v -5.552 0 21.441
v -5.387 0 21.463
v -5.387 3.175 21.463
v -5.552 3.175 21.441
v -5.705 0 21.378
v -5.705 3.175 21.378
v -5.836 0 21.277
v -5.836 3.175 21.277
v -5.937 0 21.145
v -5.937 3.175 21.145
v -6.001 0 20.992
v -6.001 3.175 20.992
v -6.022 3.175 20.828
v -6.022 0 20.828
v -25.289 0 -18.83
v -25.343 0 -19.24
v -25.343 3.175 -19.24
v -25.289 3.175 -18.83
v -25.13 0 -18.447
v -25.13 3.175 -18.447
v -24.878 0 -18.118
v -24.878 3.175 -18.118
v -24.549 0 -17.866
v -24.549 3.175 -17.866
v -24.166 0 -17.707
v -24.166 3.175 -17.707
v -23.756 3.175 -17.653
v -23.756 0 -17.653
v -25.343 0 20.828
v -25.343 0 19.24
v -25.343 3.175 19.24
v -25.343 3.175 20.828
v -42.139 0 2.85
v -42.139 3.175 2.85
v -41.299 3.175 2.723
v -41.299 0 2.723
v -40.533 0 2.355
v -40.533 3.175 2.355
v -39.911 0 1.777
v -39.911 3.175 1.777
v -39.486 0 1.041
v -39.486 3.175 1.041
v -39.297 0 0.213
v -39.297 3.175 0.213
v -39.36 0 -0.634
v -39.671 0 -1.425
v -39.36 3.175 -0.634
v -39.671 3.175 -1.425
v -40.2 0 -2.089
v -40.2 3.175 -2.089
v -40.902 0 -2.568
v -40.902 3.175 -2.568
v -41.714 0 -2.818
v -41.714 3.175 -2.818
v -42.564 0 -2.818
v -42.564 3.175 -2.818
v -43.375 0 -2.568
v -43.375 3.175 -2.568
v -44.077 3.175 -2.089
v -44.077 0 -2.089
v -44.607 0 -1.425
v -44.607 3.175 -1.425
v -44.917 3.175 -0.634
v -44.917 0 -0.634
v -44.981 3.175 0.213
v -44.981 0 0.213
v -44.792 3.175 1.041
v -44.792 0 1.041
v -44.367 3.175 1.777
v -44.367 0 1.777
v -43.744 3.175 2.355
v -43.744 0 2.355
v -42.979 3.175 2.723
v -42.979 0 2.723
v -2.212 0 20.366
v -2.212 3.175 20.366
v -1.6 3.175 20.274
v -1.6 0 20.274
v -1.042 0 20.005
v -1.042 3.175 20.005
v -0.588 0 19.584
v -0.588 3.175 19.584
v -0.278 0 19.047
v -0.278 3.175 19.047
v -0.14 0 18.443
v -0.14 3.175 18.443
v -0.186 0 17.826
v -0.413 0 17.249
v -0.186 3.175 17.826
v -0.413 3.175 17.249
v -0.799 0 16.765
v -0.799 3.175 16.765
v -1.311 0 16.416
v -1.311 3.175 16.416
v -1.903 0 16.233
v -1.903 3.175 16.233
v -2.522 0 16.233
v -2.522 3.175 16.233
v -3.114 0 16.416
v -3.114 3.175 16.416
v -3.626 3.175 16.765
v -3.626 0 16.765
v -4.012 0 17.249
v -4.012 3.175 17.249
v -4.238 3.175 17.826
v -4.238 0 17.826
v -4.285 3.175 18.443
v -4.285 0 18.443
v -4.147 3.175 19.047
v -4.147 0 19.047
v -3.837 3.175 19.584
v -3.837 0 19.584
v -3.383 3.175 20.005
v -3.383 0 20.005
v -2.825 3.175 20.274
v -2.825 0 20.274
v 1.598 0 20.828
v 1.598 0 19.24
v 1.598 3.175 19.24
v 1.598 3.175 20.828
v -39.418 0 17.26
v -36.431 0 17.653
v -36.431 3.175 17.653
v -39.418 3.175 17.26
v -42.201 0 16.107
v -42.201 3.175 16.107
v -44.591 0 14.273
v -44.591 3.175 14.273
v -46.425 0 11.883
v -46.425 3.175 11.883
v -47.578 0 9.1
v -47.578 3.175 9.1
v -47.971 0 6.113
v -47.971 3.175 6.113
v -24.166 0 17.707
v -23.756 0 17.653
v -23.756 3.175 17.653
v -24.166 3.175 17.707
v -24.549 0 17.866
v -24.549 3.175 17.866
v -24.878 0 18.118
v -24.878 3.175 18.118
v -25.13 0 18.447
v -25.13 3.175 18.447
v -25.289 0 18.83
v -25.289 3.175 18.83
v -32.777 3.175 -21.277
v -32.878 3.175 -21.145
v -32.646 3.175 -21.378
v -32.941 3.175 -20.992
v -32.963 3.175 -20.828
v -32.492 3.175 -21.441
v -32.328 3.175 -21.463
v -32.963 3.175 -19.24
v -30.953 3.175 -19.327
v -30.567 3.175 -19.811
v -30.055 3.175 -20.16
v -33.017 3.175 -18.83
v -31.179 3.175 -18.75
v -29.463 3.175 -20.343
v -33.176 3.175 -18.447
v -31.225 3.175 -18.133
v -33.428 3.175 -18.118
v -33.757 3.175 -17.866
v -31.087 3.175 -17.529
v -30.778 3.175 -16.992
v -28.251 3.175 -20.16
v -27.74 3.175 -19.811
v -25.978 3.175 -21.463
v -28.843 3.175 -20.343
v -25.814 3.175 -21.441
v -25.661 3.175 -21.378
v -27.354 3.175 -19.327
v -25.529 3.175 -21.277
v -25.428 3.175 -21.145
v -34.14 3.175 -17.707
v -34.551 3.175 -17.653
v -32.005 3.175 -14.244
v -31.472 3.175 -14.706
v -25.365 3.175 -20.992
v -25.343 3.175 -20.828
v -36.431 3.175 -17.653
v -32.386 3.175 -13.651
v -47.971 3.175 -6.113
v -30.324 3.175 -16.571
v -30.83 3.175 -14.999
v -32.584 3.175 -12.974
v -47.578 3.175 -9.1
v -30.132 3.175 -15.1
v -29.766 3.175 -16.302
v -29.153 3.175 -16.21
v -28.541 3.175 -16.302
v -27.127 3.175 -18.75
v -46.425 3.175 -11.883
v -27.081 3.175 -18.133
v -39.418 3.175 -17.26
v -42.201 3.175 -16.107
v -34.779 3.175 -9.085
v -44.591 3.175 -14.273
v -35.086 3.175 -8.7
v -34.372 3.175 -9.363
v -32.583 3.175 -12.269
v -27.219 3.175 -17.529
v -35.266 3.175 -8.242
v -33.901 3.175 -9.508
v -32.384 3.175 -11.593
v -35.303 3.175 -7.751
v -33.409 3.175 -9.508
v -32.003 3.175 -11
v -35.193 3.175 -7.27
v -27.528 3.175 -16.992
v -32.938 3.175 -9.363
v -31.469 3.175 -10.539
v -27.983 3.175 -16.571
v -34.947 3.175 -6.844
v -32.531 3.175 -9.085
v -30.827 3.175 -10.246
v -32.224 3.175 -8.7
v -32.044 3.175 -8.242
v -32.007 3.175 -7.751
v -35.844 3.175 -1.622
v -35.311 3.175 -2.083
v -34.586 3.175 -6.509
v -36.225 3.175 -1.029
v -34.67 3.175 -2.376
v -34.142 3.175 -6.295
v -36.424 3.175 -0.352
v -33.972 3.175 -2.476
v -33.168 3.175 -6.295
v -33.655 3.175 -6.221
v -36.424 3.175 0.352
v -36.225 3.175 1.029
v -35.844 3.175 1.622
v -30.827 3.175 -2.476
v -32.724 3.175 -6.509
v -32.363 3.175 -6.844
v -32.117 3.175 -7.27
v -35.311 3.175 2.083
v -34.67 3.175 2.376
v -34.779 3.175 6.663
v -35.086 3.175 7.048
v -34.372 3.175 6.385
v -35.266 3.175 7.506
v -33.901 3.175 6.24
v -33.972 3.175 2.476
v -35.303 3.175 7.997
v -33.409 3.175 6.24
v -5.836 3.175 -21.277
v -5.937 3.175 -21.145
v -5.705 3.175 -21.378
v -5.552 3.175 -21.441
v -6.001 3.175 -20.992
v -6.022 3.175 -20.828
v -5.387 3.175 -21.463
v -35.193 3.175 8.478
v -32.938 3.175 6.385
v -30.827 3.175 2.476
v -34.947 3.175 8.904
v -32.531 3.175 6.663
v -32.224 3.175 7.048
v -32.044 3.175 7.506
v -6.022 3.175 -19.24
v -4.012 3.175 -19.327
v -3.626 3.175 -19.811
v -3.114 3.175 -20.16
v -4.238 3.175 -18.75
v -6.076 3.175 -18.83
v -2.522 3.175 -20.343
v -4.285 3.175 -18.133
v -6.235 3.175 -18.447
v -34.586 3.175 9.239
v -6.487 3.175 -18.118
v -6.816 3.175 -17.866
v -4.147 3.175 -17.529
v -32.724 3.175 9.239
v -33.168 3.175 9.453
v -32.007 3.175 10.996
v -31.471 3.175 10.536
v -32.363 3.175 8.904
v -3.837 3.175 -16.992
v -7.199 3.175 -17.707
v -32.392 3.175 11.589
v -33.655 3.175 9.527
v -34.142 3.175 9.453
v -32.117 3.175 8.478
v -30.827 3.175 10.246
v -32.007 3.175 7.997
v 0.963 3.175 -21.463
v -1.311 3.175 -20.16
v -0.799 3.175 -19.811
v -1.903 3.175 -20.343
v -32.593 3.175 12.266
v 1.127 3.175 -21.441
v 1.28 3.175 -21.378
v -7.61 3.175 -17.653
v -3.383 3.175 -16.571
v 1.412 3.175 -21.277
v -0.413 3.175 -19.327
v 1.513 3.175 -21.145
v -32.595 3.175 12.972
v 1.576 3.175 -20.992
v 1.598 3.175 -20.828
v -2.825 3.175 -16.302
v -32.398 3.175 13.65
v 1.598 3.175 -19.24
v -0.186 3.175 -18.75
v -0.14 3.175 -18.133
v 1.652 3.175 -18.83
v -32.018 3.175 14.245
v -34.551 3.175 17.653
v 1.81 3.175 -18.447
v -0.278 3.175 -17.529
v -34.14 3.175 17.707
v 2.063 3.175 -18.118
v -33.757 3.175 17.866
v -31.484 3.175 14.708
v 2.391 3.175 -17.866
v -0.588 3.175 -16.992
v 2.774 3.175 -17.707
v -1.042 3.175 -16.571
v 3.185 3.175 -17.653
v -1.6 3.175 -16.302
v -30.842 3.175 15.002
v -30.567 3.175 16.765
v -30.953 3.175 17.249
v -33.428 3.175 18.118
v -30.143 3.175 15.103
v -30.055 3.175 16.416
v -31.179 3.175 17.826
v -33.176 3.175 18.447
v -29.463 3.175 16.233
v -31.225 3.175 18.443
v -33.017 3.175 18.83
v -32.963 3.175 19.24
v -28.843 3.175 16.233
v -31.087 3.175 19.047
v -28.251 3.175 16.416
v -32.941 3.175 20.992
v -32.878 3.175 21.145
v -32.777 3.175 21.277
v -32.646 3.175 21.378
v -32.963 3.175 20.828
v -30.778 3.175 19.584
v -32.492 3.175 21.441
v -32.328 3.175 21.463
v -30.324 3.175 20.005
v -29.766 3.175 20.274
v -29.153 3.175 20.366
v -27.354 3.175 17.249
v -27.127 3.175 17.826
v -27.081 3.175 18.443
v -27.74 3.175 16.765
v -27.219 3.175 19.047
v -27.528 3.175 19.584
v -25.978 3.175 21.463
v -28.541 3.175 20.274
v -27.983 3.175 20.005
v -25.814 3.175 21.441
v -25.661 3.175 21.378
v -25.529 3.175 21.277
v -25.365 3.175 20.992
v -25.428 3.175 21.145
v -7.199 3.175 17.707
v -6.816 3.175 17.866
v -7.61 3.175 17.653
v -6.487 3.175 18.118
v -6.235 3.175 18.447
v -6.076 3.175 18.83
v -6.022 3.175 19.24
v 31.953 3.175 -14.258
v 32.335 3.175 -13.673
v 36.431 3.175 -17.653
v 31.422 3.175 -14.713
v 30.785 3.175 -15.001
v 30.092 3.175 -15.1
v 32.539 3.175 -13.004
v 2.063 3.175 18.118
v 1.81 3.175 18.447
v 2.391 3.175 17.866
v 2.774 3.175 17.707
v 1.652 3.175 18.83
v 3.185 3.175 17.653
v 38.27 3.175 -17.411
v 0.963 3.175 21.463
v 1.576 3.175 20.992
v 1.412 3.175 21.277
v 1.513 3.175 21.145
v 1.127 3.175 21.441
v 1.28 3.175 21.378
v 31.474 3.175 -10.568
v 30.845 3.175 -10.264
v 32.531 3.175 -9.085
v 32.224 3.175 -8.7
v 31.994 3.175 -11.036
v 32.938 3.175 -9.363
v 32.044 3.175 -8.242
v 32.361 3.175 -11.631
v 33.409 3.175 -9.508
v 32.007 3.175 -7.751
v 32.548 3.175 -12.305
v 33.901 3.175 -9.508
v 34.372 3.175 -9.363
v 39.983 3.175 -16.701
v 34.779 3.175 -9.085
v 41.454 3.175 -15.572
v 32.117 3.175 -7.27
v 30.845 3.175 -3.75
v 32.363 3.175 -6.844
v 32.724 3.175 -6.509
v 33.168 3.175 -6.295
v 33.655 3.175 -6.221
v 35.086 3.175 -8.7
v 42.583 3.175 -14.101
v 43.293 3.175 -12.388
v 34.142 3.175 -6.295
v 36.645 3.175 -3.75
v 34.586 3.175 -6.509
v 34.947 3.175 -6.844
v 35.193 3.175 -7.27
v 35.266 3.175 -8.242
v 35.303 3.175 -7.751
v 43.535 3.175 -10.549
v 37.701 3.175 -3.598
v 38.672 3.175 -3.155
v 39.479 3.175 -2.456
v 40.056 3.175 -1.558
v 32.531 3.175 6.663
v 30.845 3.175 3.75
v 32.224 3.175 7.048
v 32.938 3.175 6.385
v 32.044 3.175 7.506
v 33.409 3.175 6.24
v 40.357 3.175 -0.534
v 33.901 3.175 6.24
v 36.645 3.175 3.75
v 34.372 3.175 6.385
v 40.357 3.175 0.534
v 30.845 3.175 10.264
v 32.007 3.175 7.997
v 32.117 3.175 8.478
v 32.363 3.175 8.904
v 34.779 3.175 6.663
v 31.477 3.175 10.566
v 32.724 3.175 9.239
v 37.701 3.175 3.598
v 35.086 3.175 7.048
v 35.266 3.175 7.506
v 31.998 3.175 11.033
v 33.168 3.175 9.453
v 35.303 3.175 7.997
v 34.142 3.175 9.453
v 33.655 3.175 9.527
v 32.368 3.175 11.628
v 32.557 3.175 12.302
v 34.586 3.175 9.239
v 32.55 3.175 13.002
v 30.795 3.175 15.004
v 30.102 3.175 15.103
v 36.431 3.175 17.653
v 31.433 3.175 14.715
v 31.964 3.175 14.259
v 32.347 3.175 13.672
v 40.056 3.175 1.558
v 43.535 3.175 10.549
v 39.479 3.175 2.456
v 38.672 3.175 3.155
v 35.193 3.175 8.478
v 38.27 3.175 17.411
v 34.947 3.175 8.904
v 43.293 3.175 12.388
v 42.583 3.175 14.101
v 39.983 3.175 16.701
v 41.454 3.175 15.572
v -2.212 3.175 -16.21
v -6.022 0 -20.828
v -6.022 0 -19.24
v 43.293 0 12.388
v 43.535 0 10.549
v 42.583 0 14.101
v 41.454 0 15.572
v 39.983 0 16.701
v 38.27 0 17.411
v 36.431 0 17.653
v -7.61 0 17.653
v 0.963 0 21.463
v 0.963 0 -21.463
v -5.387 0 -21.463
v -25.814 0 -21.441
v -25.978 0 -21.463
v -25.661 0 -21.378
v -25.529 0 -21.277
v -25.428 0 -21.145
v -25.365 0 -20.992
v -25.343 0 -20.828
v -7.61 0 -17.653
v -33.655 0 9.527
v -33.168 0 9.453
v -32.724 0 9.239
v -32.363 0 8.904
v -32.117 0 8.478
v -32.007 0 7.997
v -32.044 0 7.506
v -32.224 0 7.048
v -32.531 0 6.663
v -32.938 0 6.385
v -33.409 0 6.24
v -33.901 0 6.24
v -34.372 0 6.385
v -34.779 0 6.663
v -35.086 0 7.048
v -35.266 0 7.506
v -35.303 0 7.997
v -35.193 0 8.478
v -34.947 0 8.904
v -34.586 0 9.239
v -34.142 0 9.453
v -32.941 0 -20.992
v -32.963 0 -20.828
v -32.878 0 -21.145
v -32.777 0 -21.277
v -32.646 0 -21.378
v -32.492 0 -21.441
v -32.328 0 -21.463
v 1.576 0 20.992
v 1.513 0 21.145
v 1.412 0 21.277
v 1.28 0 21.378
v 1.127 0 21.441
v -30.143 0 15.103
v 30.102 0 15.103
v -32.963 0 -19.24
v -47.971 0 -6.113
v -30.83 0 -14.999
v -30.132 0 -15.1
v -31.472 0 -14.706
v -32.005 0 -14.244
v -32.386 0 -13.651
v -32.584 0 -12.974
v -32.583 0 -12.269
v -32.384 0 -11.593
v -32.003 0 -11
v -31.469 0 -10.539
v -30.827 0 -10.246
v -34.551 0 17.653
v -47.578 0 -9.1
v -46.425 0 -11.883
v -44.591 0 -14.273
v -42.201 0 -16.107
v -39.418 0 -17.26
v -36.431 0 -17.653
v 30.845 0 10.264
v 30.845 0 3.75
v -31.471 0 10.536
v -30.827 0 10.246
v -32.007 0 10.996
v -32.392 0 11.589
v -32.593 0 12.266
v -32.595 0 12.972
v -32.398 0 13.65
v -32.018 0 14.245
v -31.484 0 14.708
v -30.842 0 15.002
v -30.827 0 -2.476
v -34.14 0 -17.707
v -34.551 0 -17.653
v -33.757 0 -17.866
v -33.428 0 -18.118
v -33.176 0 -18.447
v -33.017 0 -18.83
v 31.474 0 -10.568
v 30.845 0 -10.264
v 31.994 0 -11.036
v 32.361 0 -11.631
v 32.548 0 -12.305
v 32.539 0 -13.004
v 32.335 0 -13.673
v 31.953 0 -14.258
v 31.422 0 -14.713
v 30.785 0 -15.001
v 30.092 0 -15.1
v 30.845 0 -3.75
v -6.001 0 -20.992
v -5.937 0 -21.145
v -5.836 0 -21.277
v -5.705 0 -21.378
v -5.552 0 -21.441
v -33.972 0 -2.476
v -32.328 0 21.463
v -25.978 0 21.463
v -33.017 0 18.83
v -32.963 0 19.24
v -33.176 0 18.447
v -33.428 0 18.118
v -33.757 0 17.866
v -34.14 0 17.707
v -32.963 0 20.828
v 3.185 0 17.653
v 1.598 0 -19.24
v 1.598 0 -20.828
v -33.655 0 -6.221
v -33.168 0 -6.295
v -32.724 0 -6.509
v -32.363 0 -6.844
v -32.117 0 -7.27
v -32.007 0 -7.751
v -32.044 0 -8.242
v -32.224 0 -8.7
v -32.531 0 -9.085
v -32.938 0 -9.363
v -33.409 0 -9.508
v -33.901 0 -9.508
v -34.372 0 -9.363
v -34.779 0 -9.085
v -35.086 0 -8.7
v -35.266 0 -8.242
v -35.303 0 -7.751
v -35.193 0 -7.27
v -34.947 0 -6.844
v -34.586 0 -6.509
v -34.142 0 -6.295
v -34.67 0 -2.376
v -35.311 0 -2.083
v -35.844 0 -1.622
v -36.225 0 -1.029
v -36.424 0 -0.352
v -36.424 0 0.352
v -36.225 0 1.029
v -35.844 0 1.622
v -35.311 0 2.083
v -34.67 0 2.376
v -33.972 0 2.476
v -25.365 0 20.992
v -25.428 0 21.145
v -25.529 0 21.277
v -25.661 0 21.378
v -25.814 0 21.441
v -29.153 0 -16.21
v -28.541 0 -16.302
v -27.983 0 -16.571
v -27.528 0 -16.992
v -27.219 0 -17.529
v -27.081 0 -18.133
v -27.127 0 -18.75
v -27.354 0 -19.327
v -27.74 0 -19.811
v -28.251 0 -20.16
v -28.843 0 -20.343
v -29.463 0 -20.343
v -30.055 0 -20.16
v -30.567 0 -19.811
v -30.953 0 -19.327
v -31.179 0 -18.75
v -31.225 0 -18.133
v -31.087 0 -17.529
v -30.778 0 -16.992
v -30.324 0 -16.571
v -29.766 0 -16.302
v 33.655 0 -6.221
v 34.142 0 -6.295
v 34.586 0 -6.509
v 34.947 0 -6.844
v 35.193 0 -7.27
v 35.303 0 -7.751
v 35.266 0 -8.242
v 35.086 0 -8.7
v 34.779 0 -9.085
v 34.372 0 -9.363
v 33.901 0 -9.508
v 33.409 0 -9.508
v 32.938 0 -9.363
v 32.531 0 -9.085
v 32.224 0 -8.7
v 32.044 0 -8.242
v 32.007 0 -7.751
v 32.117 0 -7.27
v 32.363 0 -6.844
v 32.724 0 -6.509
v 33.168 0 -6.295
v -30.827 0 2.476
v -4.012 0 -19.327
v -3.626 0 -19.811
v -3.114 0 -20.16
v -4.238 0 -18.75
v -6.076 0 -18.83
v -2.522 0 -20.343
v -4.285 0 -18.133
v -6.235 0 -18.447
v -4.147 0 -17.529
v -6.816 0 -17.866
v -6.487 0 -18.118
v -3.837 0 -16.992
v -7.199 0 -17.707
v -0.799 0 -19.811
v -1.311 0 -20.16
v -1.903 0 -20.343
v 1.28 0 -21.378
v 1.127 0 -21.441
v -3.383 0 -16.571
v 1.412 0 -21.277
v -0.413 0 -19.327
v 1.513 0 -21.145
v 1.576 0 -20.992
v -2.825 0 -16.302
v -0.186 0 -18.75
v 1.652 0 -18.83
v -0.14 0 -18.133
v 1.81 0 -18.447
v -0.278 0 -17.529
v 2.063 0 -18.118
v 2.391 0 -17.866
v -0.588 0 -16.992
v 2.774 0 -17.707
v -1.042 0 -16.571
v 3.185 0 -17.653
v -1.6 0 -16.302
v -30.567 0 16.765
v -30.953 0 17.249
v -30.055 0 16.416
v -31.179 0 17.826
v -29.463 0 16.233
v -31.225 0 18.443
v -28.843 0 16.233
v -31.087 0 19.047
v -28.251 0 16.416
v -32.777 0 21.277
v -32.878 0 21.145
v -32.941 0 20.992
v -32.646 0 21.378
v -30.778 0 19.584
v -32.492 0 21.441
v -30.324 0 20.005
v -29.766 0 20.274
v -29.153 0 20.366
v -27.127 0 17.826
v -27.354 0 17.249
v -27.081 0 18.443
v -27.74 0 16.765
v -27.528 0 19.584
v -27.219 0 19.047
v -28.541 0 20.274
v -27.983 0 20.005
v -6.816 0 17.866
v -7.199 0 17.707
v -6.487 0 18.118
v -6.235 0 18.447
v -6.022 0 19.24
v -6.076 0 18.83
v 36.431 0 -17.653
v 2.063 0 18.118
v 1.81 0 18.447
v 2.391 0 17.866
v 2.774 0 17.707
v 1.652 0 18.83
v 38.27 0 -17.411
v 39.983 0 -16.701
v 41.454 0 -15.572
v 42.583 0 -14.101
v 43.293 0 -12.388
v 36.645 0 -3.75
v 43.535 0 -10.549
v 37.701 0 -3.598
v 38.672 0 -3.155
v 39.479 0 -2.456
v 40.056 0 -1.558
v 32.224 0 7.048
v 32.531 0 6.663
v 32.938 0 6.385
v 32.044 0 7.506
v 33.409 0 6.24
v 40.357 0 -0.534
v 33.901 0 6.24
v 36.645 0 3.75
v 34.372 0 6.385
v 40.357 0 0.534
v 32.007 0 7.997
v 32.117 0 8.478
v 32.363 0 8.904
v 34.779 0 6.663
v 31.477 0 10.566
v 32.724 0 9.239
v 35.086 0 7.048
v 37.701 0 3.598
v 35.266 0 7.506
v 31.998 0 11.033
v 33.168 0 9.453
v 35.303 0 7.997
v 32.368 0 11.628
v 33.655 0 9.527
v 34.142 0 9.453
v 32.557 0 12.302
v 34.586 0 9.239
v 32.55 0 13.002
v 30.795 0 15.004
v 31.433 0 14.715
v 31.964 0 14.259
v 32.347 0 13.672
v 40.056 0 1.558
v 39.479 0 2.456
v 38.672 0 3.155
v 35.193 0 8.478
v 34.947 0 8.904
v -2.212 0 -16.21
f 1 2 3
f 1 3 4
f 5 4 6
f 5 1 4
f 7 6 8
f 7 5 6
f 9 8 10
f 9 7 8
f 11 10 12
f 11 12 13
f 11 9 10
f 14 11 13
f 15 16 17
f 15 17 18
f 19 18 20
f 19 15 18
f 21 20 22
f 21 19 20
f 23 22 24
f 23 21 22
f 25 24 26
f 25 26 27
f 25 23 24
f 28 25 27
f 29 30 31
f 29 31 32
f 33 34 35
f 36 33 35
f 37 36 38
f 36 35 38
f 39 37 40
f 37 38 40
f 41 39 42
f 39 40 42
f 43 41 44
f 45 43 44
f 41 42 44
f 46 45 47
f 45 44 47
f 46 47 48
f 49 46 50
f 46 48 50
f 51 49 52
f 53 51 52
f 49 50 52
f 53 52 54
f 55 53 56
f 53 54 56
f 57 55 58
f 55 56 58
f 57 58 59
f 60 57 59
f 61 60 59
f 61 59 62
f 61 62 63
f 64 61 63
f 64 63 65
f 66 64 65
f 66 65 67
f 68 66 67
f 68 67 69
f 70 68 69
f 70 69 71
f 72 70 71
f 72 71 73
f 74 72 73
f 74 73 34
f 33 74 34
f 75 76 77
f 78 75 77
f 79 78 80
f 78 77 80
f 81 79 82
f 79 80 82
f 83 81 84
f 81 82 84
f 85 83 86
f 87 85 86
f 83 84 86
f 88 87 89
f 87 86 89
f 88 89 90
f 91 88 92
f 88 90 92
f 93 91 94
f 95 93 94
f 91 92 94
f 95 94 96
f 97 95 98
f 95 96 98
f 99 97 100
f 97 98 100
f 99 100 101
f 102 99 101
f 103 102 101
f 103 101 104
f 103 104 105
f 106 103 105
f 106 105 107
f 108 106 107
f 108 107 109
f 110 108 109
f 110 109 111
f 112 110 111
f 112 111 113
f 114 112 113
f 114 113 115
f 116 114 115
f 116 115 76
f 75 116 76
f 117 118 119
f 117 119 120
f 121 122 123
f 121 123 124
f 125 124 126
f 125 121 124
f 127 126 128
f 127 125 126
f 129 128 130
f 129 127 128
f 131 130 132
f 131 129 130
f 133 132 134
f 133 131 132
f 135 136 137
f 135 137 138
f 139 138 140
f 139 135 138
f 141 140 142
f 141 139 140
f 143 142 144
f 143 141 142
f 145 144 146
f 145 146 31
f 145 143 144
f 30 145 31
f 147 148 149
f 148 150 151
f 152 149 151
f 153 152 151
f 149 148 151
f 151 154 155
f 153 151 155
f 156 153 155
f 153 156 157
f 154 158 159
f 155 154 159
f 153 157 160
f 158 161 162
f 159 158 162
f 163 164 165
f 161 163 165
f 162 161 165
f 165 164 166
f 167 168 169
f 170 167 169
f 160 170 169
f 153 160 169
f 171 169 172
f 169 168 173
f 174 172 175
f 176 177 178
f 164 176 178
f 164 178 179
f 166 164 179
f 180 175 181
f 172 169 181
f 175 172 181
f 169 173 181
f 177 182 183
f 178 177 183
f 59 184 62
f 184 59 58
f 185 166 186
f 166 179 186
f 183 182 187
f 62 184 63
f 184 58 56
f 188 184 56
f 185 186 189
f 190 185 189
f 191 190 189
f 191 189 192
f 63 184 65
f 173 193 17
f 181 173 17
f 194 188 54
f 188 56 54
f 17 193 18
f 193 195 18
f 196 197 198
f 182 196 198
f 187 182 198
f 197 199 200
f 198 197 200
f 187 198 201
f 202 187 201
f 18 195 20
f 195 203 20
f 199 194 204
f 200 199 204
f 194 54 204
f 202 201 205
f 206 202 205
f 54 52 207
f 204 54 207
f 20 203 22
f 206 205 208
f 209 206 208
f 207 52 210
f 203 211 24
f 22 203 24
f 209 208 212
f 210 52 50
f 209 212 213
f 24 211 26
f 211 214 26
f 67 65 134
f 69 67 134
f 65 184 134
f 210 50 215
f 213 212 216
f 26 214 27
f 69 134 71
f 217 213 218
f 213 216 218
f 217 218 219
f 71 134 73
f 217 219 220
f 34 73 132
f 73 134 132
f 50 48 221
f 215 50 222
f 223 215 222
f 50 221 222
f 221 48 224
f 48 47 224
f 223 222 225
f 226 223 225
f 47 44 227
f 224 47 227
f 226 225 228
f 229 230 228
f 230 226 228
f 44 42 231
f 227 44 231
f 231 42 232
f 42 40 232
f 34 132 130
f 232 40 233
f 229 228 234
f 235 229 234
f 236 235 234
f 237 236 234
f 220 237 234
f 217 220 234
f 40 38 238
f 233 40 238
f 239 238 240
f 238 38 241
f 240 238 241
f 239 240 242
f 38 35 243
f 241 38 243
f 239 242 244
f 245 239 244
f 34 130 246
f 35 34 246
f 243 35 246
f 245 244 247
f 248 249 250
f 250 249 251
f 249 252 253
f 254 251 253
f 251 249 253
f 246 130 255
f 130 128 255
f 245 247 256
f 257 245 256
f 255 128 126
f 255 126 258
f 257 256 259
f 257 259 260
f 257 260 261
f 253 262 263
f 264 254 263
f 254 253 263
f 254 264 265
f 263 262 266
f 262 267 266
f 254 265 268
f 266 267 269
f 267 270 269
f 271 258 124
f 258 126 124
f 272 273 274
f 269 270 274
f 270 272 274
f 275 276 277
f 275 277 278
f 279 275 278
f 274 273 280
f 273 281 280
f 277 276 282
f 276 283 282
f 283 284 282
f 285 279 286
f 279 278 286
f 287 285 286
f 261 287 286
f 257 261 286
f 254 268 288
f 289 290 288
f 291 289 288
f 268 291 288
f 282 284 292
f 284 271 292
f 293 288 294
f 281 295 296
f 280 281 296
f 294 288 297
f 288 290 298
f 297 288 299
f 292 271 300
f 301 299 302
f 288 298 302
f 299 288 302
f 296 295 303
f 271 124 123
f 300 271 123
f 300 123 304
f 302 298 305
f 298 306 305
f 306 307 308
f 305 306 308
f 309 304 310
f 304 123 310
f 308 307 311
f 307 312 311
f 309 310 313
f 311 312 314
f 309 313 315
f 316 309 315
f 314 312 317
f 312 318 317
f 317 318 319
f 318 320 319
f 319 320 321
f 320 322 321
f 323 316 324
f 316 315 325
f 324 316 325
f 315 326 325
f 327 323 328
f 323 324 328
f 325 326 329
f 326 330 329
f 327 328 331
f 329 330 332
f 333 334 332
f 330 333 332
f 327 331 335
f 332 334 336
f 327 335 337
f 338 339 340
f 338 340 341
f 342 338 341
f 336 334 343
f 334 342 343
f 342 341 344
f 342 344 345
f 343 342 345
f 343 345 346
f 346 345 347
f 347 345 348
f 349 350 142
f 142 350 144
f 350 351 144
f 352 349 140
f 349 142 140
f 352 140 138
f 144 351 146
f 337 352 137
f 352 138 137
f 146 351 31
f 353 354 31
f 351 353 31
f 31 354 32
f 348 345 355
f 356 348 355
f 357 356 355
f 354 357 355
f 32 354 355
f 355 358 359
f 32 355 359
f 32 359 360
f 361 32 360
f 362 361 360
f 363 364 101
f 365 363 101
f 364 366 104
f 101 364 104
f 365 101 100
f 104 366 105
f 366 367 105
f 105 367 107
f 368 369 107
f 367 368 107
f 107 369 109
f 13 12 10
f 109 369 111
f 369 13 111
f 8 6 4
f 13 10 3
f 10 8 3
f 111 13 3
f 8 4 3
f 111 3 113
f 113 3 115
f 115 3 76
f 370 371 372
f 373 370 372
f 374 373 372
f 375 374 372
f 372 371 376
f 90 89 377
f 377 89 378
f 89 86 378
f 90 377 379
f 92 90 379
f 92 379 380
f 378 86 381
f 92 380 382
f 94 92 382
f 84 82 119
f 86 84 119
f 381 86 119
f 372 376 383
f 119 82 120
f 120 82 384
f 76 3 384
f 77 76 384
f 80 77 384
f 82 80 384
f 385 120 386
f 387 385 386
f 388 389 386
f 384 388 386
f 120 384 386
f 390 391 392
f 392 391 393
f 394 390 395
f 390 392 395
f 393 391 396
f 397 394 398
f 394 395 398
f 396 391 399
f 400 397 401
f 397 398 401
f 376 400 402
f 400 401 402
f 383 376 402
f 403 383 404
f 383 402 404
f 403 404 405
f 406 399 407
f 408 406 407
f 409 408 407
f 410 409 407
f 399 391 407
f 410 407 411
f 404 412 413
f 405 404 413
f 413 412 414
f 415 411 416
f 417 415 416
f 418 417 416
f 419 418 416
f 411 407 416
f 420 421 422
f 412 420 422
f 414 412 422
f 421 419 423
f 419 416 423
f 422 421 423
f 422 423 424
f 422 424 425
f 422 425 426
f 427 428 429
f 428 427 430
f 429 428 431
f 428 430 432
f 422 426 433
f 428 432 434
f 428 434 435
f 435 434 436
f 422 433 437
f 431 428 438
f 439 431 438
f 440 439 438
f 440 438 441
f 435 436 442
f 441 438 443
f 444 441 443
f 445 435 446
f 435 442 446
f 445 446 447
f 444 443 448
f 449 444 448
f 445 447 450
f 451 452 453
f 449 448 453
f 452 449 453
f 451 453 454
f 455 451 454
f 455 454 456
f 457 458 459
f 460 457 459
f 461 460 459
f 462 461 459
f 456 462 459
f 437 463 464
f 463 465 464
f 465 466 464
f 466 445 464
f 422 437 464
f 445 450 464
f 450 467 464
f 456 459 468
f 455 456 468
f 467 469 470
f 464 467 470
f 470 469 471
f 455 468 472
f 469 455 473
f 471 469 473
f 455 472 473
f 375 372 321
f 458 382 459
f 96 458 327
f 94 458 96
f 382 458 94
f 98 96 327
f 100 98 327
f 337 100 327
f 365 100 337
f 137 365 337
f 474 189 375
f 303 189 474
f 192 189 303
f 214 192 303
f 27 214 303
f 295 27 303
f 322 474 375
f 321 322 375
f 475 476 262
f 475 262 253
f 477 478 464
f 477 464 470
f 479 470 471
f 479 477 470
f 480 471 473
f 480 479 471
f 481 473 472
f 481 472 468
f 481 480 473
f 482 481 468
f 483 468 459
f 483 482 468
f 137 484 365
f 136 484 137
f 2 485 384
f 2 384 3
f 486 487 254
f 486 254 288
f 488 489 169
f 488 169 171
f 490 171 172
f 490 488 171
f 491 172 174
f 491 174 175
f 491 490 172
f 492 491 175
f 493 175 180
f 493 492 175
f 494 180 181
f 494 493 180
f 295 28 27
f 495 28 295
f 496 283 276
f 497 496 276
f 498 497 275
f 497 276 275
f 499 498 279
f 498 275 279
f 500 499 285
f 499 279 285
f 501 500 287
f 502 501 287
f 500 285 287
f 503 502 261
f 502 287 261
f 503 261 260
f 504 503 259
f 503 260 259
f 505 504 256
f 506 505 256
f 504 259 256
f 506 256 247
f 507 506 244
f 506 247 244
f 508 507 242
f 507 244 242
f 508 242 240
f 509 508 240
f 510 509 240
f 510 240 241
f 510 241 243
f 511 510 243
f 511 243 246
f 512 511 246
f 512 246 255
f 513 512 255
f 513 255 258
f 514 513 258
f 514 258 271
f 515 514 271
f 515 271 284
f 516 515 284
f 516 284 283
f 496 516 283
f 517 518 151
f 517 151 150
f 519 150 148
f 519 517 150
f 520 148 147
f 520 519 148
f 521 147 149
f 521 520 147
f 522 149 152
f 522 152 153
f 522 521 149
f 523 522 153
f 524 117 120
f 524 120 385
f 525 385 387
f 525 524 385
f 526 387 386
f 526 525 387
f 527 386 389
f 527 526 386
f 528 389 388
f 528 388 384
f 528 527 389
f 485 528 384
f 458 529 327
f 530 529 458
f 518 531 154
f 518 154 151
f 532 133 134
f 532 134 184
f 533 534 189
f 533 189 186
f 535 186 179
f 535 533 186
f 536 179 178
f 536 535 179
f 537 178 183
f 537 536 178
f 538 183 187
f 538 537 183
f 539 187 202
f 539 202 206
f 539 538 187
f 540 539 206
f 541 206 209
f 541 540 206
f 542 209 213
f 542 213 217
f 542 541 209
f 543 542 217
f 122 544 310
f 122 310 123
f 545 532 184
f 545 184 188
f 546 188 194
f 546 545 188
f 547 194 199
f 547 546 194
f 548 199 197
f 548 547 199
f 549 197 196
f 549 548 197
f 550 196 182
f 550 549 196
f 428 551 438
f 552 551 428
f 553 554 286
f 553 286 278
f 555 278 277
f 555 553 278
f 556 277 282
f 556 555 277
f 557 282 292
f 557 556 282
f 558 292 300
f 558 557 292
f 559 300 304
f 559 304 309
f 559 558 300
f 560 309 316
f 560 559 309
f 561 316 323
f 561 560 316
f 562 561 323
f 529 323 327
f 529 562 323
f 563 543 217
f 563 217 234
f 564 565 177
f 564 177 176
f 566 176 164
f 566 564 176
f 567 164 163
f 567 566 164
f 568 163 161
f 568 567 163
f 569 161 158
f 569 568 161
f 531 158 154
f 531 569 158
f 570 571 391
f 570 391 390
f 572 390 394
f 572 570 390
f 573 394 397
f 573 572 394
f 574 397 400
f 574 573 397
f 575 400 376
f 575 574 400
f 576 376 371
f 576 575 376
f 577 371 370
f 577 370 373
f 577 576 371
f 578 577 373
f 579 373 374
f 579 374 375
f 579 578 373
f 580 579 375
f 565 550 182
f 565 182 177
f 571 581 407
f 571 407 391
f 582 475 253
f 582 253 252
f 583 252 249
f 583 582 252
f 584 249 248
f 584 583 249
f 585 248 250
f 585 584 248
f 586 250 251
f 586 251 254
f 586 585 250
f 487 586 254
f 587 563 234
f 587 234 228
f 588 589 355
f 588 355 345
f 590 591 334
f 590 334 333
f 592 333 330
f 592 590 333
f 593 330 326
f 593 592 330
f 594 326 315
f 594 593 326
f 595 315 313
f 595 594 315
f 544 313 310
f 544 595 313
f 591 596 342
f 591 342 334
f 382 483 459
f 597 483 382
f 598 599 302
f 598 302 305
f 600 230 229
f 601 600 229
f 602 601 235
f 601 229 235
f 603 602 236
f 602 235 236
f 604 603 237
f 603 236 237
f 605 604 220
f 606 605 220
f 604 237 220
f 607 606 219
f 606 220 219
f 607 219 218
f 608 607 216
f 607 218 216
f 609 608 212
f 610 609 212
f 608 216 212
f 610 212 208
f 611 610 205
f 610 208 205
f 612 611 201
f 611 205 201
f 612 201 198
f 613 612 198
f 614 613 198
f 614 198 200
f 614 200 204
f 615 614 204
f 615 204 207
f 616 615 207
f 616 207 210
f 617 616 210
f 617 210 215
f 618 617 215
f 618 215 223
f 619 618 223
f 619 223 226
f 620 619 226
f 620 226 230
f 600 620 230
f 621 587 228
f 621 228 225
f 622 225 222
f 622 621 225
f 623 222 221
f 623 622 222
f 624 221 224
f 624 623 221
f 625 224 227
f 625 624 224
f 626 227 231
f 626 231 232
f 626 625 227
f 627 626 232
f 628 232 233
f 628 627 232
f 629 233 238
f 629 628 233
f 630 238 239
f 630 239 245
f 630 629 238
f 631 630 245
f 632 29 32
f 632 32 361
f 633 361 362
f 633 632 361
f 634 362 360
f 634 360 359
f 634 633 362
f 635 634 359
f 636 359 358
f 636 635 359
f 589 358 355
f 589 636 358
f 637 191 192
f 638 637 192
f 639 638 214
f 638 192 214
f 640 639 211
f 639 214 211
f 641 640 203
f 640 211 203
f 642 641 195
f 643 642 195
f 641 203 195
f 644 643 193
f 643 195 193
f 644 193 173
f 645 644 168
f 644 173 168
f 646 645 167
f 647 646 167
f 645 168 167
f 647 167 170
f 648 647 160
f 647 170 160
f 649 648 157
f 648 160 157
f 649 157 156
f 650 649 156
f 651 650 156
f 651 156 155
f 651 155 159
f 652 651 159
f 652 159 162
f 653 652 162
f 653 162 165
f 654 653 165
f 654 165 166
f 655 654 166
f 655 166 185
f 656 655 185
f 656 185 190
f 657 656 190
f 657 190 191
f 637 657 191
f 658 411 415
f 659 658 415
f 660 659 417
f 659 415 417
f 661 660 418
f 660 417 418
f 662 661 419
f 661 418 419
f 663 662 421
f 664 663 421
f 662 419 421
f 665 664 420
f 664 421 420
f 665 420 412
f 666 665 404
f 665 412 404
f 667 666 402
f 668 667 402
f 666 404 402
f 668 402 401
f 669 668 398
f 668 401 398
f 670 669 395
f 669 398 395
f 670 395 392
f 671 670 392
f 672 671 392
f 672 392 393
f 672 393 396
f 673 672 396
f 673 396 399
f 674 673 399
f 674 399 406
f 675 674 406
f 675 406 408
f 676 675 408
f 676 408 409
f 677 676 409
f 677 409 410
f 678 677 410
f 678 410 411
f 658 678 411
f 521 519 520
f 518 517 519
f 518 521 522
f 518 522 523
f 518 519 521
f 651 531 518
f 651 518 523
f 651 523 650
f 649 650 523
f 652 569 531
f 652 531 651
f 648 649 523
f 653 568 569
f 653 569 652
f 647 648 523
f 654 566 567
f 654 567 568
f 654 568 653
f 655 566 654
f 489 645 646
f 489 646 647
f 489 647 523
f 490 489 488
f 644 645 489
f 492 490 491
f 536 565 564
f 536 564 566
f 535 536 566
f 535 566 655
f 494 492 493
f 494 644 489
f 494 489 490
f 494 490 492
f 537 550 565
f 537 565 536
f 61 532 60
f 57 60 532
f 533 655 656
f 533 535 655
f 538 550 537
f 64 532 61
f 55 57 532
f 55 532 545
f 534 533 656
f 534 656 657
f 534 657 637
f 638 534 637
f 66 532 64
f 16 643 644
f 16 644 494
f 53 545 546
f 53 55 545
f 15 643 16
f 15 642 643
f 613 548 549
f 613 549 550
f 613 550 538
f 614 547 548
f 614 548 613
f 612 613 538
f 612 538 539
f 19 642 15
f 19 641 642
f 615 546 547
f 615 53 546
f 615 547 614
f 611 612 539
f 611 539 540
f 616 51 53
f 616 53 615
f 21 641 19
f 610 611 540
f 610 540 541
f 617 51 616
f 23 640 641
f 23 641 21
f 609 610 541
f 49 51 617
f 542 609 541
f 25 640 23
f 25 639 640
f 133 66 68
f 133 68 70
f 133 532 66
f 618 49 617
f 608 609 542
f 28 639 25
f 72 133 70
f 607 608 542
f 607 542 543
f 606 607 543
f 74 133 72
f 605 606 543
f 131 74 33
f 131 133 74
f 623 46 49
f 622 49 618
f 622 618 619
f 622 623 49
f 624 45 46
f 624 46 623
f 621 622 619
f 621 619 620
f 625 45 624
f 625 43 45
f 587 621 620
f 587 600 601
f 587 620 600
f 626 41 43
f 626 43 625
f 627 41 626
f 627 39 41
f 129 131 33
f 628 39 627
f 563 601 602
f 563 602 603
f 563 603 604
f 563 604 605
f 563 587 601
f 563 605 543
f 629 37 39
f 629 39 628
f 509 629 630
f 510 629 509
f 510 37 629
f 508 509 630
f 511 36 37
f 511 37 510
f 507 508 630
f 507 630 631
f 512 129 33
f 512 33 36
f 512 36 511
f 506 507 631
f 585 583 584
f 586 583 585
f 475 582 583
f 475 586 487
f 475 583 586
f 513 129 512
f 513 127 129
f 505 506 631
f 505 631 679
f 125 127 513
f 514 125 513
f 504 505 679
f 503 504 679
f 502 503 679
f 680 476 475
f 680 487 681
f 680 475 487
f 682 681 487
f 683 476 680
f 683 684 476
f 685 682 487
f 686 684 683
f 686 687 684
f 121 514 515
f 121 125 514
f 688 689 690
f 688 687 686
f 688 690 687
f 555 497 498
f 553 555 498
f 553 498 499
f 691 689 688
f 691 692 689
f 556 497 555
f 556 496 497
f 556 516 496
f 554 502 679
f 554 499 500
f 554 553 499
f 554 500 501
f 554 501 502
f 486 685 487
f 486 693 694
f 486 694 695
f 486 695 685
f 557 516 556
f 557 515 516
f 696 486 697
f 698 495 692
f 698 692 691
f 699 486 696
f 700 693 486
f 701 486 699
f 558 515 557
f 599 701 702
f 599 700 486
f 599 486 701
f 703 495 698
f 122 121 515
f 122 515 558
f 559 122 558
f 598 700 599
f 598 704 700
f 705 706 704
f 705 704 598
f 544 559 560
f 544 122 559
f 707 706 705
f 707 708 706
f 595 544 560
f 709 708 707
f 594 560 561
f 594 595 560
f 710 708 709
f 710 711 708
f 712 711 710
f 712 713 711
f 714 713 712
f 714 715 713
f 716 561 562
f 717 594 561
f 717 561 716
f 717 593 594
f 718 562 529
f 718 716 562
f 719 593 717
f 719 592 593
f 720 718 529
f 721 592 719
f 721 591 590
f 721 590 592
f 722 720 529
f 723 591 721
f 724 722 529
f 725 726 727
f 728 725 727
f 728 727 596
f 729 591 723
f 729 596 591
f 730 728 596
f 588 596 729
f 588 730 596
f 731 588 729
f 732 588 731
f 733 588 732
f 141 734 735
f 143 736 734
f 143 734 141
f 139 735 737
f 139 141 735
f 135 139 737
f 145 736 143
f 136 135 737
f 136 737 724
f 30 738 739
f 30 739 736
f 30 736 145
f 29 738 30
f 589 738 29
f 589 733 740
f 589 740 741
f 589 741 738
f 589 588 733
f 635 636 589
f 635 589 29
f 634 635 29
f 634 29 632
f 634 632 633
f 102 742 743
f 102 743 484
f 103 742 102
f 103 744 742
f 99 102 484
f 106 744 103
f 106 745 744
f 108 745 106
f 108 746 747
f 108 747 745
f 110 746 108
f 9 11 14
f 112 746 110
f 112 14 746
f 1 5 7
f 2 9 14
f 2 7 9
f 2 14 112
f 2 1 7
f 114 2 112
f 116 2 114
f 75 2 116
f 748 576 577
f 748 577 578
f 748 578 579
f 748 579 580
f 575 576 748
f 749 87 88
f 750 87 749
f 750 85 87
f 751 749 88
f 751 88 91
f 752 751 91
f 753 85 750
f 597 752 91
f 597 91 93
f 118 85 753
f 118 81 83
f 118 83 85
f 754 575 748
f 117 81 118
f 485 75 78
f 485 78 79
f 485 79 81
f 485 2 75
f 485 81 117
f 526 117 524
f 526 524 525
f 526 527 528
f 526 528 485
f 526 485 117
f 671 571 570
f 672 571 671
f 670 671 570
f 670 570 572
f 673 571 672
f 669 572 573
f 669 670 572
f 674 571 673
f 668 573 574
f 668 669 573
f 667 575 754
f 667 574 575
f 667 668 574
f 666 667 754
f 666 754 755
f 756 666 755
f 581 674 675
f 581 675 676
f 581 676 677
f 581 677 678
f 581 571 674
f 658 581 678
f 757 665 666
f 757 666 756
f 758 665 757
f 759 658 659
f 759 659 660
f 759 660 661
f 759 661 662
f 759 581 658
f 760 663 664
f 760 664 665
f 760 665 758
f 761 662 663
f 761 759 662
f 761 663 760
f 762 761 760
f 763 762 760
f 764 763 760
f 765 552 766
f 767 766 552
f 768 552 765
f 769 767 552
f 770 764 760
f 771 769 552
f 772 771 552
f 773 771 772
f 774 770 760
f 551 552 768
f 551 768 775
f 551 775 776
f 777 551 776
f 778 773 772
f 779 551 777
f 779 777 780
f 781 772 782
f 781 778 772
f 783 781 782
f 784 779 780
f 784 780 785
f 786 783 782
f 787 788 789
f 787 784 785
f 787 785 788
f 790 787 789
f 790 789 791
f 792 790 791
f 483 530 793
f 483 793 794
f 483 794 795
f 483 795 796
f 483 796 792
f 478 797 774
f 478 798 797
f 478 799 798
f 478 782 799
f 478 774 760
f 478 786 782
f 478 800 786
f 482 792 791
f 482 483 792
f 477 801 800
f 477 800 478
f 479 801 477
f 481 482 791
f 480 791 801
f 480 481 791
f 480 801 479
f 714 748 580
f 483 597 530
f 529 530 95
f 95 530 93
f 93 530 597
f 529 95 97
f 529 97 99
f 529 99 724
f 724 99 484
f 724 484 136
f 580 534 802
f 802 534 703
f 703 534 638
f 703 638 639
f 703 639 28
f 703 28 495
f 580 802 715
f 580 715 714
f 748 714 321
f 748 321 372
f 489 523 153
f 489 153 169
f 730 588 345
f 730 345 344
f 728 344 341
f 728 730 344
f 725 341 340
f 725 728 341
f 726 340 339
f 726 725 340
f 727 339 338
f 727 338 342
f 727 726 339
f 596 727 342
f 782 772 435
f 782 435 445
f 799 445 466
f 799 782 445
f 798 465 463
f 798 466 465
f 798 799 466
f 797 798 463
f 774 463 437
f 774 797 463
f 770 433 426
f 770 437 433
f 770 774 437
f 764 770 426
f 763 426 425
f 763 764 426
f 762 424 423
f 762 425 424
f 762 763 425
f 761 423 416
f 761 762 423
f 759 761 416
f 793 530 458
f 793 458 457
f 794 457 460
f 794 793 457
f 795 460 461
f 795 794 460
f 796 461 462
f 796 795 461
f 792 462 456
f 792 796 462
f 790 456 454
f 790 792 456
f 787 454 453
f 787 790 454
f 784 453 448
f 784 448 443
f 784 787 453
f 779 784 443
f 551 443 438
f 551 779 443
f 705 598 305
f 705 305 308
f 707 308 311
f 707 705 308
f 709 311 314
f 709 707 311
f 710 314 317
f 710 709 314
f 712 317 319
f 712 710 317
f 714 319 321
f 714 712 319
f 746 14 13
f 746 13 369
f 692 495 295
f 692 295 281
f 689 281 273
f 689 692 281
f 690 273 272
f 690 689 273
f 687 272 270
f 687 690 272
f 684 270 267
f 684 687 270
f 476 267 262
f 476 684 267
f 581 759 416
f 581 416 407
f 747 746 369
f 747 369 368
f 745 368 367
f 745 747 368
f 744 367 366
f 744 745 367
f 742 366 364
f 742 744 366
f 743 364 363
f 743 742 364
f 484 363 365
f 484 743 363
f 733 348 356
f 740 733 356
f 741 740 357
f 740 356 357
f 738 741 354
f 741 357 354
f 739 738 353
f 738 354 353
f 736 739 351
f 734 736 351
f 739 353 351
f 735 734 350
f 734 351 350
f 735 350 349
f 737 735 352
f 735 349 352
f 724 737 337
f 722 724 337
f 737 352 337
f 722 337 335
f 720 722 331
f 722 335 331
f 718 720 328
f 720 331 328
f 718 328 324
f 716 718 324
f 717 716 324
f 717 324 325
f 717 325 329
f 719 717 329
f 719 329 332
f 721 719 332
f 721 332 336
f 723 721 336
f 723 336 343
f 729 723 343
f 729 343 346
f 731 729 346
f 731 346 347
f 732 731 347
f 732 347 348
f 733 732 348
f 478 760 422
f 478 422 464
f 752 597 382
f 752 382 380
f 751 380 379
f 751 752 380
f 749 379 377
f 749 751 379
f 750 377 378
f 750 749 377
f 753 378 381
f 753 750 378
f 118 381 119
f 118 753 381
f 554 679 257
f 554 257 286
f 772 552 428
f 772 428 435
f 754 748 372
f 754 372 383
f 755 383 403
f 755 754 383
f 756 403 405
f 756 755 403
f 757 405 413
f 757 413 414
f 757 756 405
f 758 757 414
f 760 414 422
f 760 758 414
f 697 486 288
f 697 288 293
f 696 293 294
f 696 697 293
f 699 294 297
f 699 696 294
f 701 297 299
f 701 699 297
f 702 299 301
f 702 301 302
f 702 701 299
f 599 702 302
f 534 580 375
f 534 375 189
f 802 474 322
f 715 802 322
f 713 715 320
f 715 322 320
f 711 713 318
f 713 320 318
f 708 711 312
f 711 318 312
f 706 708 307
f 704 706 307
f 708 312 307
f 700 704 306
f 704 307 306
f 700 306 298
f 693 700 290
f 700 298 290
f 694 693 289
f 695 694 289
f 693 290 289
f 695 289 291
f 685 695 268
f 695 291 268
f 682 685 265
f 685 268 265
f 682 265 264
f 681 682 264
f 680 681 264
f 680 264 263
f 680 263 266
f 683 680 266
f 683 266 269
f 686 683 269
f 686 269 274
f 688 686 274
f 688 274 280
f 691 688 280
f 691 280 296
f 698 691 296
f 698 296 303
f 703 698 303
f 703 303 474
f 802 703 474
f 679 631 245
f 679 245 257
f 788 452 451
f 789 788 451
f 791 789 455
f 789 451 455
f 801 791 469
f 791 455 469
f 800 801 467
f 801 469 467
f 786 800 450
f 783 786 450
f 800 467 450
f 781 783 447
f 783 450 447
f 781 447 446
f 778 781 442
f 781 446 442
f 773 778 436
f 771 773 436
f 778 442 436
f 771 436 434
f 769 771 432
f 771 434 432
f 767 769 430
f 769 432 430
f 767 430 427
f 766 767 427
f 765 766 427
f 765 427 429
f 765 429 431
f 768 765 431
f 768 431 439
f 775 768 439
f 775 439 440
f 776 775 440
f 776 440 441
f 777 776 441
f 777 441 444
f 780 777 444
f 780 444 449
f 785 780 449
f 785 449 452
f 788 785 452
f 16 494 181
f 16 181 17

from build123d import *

# Parameters (mm, degrees)
CROQUIS1_R                 = 1.35255
CROQUIS1_R_2               = 1.778
SALIENTE_EXTRUIR1_DEPTH    = 3.175
CROQUIS5_R                 = 2.55
CORTAR_EXTRUIR1_DEPTH      = 53.649355209
CORTAR_EXTRUIR2_DEPTH      = 53.649355209
CORTAR_EXTRUIR2_DEPTH_BACK = 53.649355209
CROQUIS10_R                = 2.078
CROQUIS10_R_2              = 1.65255
CROQUIS10_R_3              = 2.85
CORTAR_EXTRUIR3_DEPTH      = 53.649355209


with BuildPart() as part:
    # Croquis1 → Saliente-Extruir1 (new body)
    with BuildSketch(Plane.XZ):
        with BuildLine():
            Line((-6.02234, -19.2405), (-6.02234, -20.828))
            ThreePointArc((-6.02234, -20.828), (-5.836352806, -21.277012806), (-5.38734, -21.463))
            Line((-5.38734, -21.463), (0.96266, -21.463))
            ThreePointArc((0.96266, -21.463), (1.411672806, -21.277012806), (1.59766, -20.828))
            Line((1.59766, -20.828), (1.59766, -19.2405))
            ThreePointArc((1.59766, -19.2405), (2.062627985, -18.117967985), (3.18516, -17.653))
            Line((3.18516, -17.653), (36.43122, -17.653))
            ThreePointArc((36.43122, -17.653), (41.454190356, -15.572417555), (43.534772801, -10.549447199))
            Line((43.534772801, -10.549447199), (43.534772801, 10.549447199))
            ThreePointArc((43.534772801, 10.549447199), (41.454190356, 15.572417555), (36.43122, 17.653))
            Line((36.43122, 17.653), (3.18516, 17.653))
            ThreePointArc((3.18516, 17.653), (2.062627985, 18.117967985), (1.59766, 19.2405))
            Line((1.59766, 19.2405), (1.59766, 20.828))
            ThreePointArc((1.59766, 20.828), (1.411672806, 21.277012806), (0.96266, 21.463))
            Line((0.96266, 21.463), (-5.38734, 21.463))
            ThreePointArc((-5.38734, 21.463), (-5.836352806, 21.277012806), (-6.02234, 20.828))
            Line((-6.02234, 20.828), (-6.02234, 19.2405))
            ThreePointArc((-6.02234, 19.2405), (-6.487307985, 18.117967985), (-7.60984, 17.653))
            Line((-7.60984, 17.653), (-23.755604, 17.653))
            ThreePointArc((-23.755604, 17.653), (-24.878136015, 18.117967985), (-25.343104, 19.2405))
            Line((-25.343104, 19.2405), (-25.343104, 20.828))
            ThreePointArc((-25.343104, 20.828), (-25.529091194, 21.277012806), (-25.978104, 21.463))
            Line((-25.978104, 21.463), (-32.328104, 21.463))
            ThreePointArc((-32.328104, 21.463), (-32.777116806, 21.277012806), (-32.963104, 20.828))
            Line((-32.963104, 20.828), (-32.963104, 19.2405))
            ThreePointArc((-32.963104, 19.2405), (-33.428071985, 18.117967985), (-34.550604, 17.653))
            Line((-34.550604, 17.653), (-36.43122, 17.653))
            ThreePointArc((-36.43122, 17.653), (-44.591052878, 14.273086555), (-47.970966323, 6.113253677))
            Line((-47.970966323, 6.113253677), (-47.970966323, -6.113253677))
            ThreePointArc((-47.970966323, -6.113253677), (-44.591052878, -14.273086555), (-36.43122, -17.653))
            Line((-36.43122, -17.653), (-34.550604, -17.653))
            ThreePointArc((-34.550604, -17.653), (-33.428071985, -18.117967985), (-32.963104, -19.2405))
            Line((-32.963104, -19.2405), (-32.963104, -20.828))
            ThreePointArc((-32.963104, -20.828), (-32.777116806, -21.277012806), (-32.328104, -21.463))
            Line((-32.328104, -21.463), (-25.978104, -21.463))
            ThreePointArc((-25.978104, -21.463), (-25.529091194, -21.277012806), (-25.343104, -20.828))
            Line((-25.343104, -20.828), (-25.343104, -19.2405))
            ThreePointArc((-25.343104, -19.2405), (-24.878136015, -18.117967985), (-23.755604, -17.653))
            Line((-23.755604, -17.653), (-7.60984, -17.653))
            ThreePointArc((-7.60984, -17.653), (-6.487307985, -18.117967985), (-6.02234, -19.2405))
        make_face()
        with Locations(Location((33.655, -7.874, 0), (0, 0, 90))):
            Circle(CROQUIS1_R, mode=Mode.SUBTRACT)
        with Locations(Location((-33.655, 7.874, 0), (0, 0, 90))):
            Circle(CROQUIS1_R, mode=Mode.SUBTRACT)
        with Locations(Location((-33.655, -7.874, 0), (0, 0, 90))):
            Circle(CROQUIS1_R, mode=Mode.SUBTRACT)
        with Locations(Location((-2.21234, 18.288, 0), (0, 0, 90))):
            Circle(CROQUIS1_R_2, mode=Mode.SUBTRACT)
        with Locations(Location((-29.153104, -18.288, 0), (0, 0, 90))):
            Circle(CROQUIS1_R_2, mode=Mode.SUBTRACT)
        with Locations(Location((-2.21234, -18.288, 0), (0, 0, 90))):
            Circle(CROQUIS1_R_2, mode=Mode.SUBTRACT)
        with Locations(Location((-29.153104, 18.288, 0), (0, 0, 90))):
            Circle(CROQUIS1_R_2, mode=Mode.SUBTRACT)
        with Locations(Location((33.655, 7.874, 0), (0, 0, 90))):
            Circle(CROQUIS1_R, mode=Mode.SUBTRACT)
        with BuildLine():
            Line((-33.9725, 2.4765), (-30.827491336, 2.4765))
            Line((-30.827491336, 2.4765), (-30.827491336, 10.246241112))
            ThreePointArc((-30.827491336, 10.246241112), (-32.595430826, 12.971859774), (-30.143156557, 15.102812154))
            Line((-30.143156557, 15.102812154), (30.102172211, 15.102812154))
            ThreePointArc((30.102172211, 15.102812154), (32.54999843, 13.002076782), (30.845, 10.263843291))
            Line((30.845, 10.263843291), (30.845, 2.4765))
            Line((30.845, 2.4765), (33.9725, 2.4765))
            ThreePointArc((33.9725, 2.4765), (36.449, 0), (33.9725, -2.4765))
            Line((33.9725, -2.4765), (30.845, -2.4765))
            Line((30.845, -2.4765), (30.845, -10.263843291))
            ThreePointArc((30.845, -10.263843291), (32.539365892, -13.004061323), (30.092328369, -15.099694402))
            Line((30.092328369, -15.099694402), (-30.132404788, -15.099694402))
            ThreePointArc((-30.132404788, -15.099694402), (-32.583891793, -12.974283727), (-30.827491336, -10.246241112))
            Line((-30.827491336, -10.246241112), (-30.827491336, -2.4765))
            Line((-30.827491336, -2.4765), (-33.9725, -2.4765))
            ThreePointArc((-33.9725, -2.4765), (-36.449, 0), (-33.9725, 2.4765))
        make_face(mode=Mode.SUBTRACT)
    extrude(amount=-SALIENTE_EXTRUIR1_DEPTH)

    # Croquis5 → Cortar-Extruir1 (cut, through all)
    with BuildSketch(Plane(origin=(0, 3.175, 0), x_dir=(1, 0, 0), z_dir=(0, 1, 0))):
        with Locations(Location((-42.138904379, 0, 0), (0, 0, 270))):
            Circle(CROQUIS5_R)
    extrude(amount=-CORTAR_EXTRUIR1_DEPTH, mode=Mode.SUBTRACT)

    # Croquis9 → Cortar-Extruir2 (cut, two sides: drawn at the far end of the back side and taken through both)
    with BuildSketch(Plane(origin=(0, 3.175, 0), x_dir=(1, 0, 0), z_dir=(0, 1, 0)).offset(-CORTAR_EXTRUIR2_DEPTH_BACK)):
        with BuildLine():
            Line((30.845, -2.4765), (30.845, -3.75))
            Line((30.845, -3.75), (36.645, -3.75))
            ThreePointArc((36.645, -3.75), (40.395, 0), (36.645, 3.75))
            Line((36.645, 3.75), (30.845, 3.75))
            Line((30.845, 3.75), (30.845, 2.4765))
            Line((30.845, 2.4765), (33.9725, 2.4765))
            ThreePointArc((33.9725, 2.4765), (36.449, 0), (33.9725, -2.4765))
            Line((33.9725, -2.4765), (30.845, -2.4765))
        make_face()
    extrude(amount=CORTAR_EXTRUIR2_DEPTH + CORTAR_EXTRUIR2_DEPTH_BACK, mode=Mode.SUBTRACT)

    # Croquis10 → Cortar-Extruir3 (cut, through all)
    with BuildSketch(Plane(origin=(0, 3.175, 0), x_dir=(1, 0, 0), z_dir=(0, 1, 0))):
        with Locations(Location((-29.153104, 18.288, 0), (0, 0, 270))):
            Circle(CROQUIS10_R)
        with Locations(Location((-33.655, 7.874, 0), (0, 0, 270))):
            Circle(CROQUIS10_R_2)
        with Locations(Location((-42.138904379, 0, 0), (0, 0, 270))):
            Circle(CROQUIS10_R_3)
        with Locations(Location((-33.655, -7.874, 0), (0, 0, 270))):
            Circle(CROQUIS10_R_2)
        with Locations(Location((-29.153104, -18.288, 0), (0, 0, 270))):
            Circle(CROQUIS10_R)
        with Locations(Location((-2.21234, -18.288, 0), (0, 0, 270))):
            Circle(CROQUIS10_R)
        with Locations(Location((-2.21234, 18.288, 0), (0, 0, 270))):
            Circle(CROQUIS10_R)
        with Locations(Location((33.655, 7.874, 0), (0, 0, 270))):
            Circle(CROQUIS10_R_2)
        with Locations(Location((33.655, -7.874, 0), (0, 0, 270))):
            Circle(CROQUIS10_R_2)
    extrude(amount=-CORTAR_EXTRUIR3_DEPTH, mode=Mode.SUBTRACT)


solid = part.part
